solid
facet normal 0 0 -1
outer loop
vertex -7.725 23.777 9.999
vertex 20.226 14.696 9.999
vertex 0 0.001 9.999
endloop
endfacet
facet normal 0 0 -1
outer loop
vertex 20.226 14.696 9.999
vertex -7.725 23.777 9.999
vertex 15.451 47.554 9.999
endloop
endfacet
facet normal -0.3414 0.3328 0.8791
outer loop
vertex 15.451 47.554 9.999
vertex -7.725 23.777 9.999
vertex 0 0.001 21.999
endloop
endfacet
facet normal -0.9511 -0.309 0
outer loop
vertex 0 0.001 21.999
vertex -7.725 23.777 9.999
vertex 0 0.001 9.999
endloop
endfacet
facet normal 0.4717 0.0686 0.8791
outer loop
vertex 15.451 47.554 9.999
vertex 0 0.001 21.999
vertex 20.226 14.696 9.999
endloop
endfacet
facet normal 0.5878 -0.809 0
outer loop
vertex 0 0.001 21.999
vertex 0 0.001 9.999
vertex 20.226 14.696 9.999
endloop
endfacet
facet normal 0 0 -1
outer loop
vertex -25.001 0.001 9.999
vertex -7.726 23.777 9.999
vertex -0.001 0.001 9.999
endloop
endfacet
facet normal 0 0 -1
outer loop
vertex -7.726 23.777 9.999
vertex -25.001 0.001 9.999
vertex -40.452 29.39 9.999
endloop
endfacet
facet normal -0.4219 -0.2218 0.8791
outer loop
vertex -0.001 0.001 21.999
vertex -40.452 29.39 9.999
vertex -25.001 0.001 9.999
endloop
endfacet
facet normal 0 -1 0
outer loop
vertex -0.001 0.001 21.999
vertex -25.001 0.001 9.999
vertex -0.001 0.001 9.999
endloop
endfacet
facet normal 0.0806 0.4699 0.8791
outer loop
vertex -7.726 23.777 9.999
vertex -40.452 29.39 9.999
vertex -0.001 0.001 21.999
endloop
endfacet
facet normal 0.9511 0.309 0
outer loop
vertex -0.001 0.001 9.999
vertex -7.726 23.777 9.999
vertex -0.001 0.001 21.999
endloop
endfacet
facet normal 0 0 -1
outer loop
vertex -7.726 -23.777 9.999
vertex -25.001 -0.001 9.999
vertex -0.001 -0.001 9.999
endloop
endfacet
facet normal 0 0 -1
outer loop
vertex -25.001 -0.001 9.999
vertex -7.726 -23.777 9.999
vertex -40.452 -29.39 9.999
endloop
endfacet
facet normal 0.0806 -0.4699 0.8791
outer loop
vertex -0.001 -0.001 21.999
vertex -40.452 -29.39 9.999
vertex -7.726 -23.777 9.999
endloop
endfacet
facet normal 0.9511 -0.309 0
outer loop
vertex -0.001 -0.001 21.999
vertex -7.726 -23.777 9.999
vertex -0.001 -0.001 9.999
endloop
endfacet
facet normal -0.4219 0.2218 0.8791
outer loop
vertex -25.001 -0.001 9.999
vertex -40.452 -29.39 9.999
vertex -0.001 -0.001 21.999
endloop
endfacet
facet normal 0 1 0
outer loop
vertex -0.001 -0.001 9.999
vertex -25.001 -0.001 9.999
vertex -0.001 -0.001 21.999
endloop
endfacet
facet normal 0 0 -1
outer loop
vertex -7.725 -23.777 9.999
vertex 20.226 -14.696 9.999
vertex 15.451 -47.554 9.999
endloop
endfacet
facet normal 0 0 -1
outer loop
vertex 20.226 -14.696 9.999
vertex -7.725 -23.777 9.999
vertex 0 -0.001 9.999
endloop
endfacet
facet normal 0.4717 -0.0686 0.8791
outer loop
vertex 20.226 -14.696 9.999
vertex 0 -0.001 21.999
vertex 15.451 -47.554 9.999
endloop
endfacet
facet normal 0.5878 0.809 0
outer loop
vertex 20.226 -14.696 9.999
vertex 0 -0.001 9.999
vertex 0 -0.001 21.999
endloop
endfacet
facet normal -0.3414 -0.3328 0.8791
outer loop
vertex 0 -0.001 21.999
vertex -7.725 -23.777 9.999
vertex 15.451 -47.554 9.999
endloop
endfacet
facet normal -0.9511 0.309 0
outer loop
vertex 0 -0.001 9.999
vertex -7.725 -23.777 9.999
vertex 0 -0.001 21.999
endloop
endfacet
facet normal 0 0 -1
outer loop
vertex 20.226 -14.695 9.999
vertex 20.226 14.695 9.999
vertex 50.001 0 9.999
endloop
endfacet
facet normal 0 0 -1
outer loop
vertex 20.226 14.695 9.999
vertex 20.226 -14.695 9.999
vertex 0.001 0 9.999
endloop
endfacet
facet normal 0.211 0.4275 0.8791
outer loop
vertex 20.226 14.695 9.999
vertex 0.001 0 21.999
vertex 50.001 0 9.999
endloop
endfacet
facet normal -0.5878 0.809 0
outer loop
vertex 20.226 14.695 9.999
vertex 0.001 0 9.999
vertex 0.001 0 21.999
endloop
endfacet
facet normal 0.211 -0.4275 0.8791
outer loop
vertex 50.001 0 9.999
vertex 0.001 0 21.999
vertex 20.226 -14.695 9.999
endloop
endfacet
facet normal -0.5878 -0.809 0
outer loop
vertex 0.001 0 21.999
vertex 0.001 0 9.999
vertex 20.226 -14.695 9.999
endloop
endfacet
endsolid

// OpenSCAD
/*
	name: 		HalfStarRelief.scad
	author:		Aymeric B.
	date:		21.05.2014
*/


/****** PARAMETERS ****/
star_branches = 5;
star_outer_radius = 50;
star_inner_radius = 25;
star_elevation = 12;
base_height = 10;


/****** MODULES ****/
module BranchBase() {
	star_angle = 360/star_branches;
	x = star_inner_radius * cos(star_angle/2);
	y = star_inner_radius * sin(star_angle/2);
	polygon([[0, 0], [x, y], [star_outer_radius, 0], [x, -y]]);
}

module Base() {
	star_angle = 360/star_branches;
	linear_extrude(height=base_height) {
		for (s = [1:star_branches]) {
			rotate([0, 0, s*star_angle]) BranchBase();
		}
	}
}

module HalfBranch() {
	star_angle = 360 / star_branches;
	x = star_inner_radius * cos(star_angle/2);
	y = star_inner_radius * sin(star_angle/2);
	polyhedron(
		points = [[0, 0, 0], 
					[star_outer_radius, 0, 0], 
					[x, y, 0], 
					[0, 0, star_elevation]], 
		triangles = [[0, 1, 2], 
					[1, 3, 2], 
					[2, 3, 0], 
					[0, 3, 1]]);
}

module FullBranch() {
	union() {
		color("green") {
			HalfBranch();
		}
		color("red") {
			mirror([0, 1, 0]) HalfBranch();
		}
	}
}

module Relief() {
	star_angle = 360/star_branches;
	union() {
		for (s = [1:star_branches]) {
			rotate([0, 0, s*star_angle]) translate([0.001, 0, 0]) FullBranch();
		}
	}
}

module HalfStarRelief() {
	Base();
	translate([0, 0, base_height-0.001]) Relief();
}


/****** RENDERS ****/
HalfStarRelief();
